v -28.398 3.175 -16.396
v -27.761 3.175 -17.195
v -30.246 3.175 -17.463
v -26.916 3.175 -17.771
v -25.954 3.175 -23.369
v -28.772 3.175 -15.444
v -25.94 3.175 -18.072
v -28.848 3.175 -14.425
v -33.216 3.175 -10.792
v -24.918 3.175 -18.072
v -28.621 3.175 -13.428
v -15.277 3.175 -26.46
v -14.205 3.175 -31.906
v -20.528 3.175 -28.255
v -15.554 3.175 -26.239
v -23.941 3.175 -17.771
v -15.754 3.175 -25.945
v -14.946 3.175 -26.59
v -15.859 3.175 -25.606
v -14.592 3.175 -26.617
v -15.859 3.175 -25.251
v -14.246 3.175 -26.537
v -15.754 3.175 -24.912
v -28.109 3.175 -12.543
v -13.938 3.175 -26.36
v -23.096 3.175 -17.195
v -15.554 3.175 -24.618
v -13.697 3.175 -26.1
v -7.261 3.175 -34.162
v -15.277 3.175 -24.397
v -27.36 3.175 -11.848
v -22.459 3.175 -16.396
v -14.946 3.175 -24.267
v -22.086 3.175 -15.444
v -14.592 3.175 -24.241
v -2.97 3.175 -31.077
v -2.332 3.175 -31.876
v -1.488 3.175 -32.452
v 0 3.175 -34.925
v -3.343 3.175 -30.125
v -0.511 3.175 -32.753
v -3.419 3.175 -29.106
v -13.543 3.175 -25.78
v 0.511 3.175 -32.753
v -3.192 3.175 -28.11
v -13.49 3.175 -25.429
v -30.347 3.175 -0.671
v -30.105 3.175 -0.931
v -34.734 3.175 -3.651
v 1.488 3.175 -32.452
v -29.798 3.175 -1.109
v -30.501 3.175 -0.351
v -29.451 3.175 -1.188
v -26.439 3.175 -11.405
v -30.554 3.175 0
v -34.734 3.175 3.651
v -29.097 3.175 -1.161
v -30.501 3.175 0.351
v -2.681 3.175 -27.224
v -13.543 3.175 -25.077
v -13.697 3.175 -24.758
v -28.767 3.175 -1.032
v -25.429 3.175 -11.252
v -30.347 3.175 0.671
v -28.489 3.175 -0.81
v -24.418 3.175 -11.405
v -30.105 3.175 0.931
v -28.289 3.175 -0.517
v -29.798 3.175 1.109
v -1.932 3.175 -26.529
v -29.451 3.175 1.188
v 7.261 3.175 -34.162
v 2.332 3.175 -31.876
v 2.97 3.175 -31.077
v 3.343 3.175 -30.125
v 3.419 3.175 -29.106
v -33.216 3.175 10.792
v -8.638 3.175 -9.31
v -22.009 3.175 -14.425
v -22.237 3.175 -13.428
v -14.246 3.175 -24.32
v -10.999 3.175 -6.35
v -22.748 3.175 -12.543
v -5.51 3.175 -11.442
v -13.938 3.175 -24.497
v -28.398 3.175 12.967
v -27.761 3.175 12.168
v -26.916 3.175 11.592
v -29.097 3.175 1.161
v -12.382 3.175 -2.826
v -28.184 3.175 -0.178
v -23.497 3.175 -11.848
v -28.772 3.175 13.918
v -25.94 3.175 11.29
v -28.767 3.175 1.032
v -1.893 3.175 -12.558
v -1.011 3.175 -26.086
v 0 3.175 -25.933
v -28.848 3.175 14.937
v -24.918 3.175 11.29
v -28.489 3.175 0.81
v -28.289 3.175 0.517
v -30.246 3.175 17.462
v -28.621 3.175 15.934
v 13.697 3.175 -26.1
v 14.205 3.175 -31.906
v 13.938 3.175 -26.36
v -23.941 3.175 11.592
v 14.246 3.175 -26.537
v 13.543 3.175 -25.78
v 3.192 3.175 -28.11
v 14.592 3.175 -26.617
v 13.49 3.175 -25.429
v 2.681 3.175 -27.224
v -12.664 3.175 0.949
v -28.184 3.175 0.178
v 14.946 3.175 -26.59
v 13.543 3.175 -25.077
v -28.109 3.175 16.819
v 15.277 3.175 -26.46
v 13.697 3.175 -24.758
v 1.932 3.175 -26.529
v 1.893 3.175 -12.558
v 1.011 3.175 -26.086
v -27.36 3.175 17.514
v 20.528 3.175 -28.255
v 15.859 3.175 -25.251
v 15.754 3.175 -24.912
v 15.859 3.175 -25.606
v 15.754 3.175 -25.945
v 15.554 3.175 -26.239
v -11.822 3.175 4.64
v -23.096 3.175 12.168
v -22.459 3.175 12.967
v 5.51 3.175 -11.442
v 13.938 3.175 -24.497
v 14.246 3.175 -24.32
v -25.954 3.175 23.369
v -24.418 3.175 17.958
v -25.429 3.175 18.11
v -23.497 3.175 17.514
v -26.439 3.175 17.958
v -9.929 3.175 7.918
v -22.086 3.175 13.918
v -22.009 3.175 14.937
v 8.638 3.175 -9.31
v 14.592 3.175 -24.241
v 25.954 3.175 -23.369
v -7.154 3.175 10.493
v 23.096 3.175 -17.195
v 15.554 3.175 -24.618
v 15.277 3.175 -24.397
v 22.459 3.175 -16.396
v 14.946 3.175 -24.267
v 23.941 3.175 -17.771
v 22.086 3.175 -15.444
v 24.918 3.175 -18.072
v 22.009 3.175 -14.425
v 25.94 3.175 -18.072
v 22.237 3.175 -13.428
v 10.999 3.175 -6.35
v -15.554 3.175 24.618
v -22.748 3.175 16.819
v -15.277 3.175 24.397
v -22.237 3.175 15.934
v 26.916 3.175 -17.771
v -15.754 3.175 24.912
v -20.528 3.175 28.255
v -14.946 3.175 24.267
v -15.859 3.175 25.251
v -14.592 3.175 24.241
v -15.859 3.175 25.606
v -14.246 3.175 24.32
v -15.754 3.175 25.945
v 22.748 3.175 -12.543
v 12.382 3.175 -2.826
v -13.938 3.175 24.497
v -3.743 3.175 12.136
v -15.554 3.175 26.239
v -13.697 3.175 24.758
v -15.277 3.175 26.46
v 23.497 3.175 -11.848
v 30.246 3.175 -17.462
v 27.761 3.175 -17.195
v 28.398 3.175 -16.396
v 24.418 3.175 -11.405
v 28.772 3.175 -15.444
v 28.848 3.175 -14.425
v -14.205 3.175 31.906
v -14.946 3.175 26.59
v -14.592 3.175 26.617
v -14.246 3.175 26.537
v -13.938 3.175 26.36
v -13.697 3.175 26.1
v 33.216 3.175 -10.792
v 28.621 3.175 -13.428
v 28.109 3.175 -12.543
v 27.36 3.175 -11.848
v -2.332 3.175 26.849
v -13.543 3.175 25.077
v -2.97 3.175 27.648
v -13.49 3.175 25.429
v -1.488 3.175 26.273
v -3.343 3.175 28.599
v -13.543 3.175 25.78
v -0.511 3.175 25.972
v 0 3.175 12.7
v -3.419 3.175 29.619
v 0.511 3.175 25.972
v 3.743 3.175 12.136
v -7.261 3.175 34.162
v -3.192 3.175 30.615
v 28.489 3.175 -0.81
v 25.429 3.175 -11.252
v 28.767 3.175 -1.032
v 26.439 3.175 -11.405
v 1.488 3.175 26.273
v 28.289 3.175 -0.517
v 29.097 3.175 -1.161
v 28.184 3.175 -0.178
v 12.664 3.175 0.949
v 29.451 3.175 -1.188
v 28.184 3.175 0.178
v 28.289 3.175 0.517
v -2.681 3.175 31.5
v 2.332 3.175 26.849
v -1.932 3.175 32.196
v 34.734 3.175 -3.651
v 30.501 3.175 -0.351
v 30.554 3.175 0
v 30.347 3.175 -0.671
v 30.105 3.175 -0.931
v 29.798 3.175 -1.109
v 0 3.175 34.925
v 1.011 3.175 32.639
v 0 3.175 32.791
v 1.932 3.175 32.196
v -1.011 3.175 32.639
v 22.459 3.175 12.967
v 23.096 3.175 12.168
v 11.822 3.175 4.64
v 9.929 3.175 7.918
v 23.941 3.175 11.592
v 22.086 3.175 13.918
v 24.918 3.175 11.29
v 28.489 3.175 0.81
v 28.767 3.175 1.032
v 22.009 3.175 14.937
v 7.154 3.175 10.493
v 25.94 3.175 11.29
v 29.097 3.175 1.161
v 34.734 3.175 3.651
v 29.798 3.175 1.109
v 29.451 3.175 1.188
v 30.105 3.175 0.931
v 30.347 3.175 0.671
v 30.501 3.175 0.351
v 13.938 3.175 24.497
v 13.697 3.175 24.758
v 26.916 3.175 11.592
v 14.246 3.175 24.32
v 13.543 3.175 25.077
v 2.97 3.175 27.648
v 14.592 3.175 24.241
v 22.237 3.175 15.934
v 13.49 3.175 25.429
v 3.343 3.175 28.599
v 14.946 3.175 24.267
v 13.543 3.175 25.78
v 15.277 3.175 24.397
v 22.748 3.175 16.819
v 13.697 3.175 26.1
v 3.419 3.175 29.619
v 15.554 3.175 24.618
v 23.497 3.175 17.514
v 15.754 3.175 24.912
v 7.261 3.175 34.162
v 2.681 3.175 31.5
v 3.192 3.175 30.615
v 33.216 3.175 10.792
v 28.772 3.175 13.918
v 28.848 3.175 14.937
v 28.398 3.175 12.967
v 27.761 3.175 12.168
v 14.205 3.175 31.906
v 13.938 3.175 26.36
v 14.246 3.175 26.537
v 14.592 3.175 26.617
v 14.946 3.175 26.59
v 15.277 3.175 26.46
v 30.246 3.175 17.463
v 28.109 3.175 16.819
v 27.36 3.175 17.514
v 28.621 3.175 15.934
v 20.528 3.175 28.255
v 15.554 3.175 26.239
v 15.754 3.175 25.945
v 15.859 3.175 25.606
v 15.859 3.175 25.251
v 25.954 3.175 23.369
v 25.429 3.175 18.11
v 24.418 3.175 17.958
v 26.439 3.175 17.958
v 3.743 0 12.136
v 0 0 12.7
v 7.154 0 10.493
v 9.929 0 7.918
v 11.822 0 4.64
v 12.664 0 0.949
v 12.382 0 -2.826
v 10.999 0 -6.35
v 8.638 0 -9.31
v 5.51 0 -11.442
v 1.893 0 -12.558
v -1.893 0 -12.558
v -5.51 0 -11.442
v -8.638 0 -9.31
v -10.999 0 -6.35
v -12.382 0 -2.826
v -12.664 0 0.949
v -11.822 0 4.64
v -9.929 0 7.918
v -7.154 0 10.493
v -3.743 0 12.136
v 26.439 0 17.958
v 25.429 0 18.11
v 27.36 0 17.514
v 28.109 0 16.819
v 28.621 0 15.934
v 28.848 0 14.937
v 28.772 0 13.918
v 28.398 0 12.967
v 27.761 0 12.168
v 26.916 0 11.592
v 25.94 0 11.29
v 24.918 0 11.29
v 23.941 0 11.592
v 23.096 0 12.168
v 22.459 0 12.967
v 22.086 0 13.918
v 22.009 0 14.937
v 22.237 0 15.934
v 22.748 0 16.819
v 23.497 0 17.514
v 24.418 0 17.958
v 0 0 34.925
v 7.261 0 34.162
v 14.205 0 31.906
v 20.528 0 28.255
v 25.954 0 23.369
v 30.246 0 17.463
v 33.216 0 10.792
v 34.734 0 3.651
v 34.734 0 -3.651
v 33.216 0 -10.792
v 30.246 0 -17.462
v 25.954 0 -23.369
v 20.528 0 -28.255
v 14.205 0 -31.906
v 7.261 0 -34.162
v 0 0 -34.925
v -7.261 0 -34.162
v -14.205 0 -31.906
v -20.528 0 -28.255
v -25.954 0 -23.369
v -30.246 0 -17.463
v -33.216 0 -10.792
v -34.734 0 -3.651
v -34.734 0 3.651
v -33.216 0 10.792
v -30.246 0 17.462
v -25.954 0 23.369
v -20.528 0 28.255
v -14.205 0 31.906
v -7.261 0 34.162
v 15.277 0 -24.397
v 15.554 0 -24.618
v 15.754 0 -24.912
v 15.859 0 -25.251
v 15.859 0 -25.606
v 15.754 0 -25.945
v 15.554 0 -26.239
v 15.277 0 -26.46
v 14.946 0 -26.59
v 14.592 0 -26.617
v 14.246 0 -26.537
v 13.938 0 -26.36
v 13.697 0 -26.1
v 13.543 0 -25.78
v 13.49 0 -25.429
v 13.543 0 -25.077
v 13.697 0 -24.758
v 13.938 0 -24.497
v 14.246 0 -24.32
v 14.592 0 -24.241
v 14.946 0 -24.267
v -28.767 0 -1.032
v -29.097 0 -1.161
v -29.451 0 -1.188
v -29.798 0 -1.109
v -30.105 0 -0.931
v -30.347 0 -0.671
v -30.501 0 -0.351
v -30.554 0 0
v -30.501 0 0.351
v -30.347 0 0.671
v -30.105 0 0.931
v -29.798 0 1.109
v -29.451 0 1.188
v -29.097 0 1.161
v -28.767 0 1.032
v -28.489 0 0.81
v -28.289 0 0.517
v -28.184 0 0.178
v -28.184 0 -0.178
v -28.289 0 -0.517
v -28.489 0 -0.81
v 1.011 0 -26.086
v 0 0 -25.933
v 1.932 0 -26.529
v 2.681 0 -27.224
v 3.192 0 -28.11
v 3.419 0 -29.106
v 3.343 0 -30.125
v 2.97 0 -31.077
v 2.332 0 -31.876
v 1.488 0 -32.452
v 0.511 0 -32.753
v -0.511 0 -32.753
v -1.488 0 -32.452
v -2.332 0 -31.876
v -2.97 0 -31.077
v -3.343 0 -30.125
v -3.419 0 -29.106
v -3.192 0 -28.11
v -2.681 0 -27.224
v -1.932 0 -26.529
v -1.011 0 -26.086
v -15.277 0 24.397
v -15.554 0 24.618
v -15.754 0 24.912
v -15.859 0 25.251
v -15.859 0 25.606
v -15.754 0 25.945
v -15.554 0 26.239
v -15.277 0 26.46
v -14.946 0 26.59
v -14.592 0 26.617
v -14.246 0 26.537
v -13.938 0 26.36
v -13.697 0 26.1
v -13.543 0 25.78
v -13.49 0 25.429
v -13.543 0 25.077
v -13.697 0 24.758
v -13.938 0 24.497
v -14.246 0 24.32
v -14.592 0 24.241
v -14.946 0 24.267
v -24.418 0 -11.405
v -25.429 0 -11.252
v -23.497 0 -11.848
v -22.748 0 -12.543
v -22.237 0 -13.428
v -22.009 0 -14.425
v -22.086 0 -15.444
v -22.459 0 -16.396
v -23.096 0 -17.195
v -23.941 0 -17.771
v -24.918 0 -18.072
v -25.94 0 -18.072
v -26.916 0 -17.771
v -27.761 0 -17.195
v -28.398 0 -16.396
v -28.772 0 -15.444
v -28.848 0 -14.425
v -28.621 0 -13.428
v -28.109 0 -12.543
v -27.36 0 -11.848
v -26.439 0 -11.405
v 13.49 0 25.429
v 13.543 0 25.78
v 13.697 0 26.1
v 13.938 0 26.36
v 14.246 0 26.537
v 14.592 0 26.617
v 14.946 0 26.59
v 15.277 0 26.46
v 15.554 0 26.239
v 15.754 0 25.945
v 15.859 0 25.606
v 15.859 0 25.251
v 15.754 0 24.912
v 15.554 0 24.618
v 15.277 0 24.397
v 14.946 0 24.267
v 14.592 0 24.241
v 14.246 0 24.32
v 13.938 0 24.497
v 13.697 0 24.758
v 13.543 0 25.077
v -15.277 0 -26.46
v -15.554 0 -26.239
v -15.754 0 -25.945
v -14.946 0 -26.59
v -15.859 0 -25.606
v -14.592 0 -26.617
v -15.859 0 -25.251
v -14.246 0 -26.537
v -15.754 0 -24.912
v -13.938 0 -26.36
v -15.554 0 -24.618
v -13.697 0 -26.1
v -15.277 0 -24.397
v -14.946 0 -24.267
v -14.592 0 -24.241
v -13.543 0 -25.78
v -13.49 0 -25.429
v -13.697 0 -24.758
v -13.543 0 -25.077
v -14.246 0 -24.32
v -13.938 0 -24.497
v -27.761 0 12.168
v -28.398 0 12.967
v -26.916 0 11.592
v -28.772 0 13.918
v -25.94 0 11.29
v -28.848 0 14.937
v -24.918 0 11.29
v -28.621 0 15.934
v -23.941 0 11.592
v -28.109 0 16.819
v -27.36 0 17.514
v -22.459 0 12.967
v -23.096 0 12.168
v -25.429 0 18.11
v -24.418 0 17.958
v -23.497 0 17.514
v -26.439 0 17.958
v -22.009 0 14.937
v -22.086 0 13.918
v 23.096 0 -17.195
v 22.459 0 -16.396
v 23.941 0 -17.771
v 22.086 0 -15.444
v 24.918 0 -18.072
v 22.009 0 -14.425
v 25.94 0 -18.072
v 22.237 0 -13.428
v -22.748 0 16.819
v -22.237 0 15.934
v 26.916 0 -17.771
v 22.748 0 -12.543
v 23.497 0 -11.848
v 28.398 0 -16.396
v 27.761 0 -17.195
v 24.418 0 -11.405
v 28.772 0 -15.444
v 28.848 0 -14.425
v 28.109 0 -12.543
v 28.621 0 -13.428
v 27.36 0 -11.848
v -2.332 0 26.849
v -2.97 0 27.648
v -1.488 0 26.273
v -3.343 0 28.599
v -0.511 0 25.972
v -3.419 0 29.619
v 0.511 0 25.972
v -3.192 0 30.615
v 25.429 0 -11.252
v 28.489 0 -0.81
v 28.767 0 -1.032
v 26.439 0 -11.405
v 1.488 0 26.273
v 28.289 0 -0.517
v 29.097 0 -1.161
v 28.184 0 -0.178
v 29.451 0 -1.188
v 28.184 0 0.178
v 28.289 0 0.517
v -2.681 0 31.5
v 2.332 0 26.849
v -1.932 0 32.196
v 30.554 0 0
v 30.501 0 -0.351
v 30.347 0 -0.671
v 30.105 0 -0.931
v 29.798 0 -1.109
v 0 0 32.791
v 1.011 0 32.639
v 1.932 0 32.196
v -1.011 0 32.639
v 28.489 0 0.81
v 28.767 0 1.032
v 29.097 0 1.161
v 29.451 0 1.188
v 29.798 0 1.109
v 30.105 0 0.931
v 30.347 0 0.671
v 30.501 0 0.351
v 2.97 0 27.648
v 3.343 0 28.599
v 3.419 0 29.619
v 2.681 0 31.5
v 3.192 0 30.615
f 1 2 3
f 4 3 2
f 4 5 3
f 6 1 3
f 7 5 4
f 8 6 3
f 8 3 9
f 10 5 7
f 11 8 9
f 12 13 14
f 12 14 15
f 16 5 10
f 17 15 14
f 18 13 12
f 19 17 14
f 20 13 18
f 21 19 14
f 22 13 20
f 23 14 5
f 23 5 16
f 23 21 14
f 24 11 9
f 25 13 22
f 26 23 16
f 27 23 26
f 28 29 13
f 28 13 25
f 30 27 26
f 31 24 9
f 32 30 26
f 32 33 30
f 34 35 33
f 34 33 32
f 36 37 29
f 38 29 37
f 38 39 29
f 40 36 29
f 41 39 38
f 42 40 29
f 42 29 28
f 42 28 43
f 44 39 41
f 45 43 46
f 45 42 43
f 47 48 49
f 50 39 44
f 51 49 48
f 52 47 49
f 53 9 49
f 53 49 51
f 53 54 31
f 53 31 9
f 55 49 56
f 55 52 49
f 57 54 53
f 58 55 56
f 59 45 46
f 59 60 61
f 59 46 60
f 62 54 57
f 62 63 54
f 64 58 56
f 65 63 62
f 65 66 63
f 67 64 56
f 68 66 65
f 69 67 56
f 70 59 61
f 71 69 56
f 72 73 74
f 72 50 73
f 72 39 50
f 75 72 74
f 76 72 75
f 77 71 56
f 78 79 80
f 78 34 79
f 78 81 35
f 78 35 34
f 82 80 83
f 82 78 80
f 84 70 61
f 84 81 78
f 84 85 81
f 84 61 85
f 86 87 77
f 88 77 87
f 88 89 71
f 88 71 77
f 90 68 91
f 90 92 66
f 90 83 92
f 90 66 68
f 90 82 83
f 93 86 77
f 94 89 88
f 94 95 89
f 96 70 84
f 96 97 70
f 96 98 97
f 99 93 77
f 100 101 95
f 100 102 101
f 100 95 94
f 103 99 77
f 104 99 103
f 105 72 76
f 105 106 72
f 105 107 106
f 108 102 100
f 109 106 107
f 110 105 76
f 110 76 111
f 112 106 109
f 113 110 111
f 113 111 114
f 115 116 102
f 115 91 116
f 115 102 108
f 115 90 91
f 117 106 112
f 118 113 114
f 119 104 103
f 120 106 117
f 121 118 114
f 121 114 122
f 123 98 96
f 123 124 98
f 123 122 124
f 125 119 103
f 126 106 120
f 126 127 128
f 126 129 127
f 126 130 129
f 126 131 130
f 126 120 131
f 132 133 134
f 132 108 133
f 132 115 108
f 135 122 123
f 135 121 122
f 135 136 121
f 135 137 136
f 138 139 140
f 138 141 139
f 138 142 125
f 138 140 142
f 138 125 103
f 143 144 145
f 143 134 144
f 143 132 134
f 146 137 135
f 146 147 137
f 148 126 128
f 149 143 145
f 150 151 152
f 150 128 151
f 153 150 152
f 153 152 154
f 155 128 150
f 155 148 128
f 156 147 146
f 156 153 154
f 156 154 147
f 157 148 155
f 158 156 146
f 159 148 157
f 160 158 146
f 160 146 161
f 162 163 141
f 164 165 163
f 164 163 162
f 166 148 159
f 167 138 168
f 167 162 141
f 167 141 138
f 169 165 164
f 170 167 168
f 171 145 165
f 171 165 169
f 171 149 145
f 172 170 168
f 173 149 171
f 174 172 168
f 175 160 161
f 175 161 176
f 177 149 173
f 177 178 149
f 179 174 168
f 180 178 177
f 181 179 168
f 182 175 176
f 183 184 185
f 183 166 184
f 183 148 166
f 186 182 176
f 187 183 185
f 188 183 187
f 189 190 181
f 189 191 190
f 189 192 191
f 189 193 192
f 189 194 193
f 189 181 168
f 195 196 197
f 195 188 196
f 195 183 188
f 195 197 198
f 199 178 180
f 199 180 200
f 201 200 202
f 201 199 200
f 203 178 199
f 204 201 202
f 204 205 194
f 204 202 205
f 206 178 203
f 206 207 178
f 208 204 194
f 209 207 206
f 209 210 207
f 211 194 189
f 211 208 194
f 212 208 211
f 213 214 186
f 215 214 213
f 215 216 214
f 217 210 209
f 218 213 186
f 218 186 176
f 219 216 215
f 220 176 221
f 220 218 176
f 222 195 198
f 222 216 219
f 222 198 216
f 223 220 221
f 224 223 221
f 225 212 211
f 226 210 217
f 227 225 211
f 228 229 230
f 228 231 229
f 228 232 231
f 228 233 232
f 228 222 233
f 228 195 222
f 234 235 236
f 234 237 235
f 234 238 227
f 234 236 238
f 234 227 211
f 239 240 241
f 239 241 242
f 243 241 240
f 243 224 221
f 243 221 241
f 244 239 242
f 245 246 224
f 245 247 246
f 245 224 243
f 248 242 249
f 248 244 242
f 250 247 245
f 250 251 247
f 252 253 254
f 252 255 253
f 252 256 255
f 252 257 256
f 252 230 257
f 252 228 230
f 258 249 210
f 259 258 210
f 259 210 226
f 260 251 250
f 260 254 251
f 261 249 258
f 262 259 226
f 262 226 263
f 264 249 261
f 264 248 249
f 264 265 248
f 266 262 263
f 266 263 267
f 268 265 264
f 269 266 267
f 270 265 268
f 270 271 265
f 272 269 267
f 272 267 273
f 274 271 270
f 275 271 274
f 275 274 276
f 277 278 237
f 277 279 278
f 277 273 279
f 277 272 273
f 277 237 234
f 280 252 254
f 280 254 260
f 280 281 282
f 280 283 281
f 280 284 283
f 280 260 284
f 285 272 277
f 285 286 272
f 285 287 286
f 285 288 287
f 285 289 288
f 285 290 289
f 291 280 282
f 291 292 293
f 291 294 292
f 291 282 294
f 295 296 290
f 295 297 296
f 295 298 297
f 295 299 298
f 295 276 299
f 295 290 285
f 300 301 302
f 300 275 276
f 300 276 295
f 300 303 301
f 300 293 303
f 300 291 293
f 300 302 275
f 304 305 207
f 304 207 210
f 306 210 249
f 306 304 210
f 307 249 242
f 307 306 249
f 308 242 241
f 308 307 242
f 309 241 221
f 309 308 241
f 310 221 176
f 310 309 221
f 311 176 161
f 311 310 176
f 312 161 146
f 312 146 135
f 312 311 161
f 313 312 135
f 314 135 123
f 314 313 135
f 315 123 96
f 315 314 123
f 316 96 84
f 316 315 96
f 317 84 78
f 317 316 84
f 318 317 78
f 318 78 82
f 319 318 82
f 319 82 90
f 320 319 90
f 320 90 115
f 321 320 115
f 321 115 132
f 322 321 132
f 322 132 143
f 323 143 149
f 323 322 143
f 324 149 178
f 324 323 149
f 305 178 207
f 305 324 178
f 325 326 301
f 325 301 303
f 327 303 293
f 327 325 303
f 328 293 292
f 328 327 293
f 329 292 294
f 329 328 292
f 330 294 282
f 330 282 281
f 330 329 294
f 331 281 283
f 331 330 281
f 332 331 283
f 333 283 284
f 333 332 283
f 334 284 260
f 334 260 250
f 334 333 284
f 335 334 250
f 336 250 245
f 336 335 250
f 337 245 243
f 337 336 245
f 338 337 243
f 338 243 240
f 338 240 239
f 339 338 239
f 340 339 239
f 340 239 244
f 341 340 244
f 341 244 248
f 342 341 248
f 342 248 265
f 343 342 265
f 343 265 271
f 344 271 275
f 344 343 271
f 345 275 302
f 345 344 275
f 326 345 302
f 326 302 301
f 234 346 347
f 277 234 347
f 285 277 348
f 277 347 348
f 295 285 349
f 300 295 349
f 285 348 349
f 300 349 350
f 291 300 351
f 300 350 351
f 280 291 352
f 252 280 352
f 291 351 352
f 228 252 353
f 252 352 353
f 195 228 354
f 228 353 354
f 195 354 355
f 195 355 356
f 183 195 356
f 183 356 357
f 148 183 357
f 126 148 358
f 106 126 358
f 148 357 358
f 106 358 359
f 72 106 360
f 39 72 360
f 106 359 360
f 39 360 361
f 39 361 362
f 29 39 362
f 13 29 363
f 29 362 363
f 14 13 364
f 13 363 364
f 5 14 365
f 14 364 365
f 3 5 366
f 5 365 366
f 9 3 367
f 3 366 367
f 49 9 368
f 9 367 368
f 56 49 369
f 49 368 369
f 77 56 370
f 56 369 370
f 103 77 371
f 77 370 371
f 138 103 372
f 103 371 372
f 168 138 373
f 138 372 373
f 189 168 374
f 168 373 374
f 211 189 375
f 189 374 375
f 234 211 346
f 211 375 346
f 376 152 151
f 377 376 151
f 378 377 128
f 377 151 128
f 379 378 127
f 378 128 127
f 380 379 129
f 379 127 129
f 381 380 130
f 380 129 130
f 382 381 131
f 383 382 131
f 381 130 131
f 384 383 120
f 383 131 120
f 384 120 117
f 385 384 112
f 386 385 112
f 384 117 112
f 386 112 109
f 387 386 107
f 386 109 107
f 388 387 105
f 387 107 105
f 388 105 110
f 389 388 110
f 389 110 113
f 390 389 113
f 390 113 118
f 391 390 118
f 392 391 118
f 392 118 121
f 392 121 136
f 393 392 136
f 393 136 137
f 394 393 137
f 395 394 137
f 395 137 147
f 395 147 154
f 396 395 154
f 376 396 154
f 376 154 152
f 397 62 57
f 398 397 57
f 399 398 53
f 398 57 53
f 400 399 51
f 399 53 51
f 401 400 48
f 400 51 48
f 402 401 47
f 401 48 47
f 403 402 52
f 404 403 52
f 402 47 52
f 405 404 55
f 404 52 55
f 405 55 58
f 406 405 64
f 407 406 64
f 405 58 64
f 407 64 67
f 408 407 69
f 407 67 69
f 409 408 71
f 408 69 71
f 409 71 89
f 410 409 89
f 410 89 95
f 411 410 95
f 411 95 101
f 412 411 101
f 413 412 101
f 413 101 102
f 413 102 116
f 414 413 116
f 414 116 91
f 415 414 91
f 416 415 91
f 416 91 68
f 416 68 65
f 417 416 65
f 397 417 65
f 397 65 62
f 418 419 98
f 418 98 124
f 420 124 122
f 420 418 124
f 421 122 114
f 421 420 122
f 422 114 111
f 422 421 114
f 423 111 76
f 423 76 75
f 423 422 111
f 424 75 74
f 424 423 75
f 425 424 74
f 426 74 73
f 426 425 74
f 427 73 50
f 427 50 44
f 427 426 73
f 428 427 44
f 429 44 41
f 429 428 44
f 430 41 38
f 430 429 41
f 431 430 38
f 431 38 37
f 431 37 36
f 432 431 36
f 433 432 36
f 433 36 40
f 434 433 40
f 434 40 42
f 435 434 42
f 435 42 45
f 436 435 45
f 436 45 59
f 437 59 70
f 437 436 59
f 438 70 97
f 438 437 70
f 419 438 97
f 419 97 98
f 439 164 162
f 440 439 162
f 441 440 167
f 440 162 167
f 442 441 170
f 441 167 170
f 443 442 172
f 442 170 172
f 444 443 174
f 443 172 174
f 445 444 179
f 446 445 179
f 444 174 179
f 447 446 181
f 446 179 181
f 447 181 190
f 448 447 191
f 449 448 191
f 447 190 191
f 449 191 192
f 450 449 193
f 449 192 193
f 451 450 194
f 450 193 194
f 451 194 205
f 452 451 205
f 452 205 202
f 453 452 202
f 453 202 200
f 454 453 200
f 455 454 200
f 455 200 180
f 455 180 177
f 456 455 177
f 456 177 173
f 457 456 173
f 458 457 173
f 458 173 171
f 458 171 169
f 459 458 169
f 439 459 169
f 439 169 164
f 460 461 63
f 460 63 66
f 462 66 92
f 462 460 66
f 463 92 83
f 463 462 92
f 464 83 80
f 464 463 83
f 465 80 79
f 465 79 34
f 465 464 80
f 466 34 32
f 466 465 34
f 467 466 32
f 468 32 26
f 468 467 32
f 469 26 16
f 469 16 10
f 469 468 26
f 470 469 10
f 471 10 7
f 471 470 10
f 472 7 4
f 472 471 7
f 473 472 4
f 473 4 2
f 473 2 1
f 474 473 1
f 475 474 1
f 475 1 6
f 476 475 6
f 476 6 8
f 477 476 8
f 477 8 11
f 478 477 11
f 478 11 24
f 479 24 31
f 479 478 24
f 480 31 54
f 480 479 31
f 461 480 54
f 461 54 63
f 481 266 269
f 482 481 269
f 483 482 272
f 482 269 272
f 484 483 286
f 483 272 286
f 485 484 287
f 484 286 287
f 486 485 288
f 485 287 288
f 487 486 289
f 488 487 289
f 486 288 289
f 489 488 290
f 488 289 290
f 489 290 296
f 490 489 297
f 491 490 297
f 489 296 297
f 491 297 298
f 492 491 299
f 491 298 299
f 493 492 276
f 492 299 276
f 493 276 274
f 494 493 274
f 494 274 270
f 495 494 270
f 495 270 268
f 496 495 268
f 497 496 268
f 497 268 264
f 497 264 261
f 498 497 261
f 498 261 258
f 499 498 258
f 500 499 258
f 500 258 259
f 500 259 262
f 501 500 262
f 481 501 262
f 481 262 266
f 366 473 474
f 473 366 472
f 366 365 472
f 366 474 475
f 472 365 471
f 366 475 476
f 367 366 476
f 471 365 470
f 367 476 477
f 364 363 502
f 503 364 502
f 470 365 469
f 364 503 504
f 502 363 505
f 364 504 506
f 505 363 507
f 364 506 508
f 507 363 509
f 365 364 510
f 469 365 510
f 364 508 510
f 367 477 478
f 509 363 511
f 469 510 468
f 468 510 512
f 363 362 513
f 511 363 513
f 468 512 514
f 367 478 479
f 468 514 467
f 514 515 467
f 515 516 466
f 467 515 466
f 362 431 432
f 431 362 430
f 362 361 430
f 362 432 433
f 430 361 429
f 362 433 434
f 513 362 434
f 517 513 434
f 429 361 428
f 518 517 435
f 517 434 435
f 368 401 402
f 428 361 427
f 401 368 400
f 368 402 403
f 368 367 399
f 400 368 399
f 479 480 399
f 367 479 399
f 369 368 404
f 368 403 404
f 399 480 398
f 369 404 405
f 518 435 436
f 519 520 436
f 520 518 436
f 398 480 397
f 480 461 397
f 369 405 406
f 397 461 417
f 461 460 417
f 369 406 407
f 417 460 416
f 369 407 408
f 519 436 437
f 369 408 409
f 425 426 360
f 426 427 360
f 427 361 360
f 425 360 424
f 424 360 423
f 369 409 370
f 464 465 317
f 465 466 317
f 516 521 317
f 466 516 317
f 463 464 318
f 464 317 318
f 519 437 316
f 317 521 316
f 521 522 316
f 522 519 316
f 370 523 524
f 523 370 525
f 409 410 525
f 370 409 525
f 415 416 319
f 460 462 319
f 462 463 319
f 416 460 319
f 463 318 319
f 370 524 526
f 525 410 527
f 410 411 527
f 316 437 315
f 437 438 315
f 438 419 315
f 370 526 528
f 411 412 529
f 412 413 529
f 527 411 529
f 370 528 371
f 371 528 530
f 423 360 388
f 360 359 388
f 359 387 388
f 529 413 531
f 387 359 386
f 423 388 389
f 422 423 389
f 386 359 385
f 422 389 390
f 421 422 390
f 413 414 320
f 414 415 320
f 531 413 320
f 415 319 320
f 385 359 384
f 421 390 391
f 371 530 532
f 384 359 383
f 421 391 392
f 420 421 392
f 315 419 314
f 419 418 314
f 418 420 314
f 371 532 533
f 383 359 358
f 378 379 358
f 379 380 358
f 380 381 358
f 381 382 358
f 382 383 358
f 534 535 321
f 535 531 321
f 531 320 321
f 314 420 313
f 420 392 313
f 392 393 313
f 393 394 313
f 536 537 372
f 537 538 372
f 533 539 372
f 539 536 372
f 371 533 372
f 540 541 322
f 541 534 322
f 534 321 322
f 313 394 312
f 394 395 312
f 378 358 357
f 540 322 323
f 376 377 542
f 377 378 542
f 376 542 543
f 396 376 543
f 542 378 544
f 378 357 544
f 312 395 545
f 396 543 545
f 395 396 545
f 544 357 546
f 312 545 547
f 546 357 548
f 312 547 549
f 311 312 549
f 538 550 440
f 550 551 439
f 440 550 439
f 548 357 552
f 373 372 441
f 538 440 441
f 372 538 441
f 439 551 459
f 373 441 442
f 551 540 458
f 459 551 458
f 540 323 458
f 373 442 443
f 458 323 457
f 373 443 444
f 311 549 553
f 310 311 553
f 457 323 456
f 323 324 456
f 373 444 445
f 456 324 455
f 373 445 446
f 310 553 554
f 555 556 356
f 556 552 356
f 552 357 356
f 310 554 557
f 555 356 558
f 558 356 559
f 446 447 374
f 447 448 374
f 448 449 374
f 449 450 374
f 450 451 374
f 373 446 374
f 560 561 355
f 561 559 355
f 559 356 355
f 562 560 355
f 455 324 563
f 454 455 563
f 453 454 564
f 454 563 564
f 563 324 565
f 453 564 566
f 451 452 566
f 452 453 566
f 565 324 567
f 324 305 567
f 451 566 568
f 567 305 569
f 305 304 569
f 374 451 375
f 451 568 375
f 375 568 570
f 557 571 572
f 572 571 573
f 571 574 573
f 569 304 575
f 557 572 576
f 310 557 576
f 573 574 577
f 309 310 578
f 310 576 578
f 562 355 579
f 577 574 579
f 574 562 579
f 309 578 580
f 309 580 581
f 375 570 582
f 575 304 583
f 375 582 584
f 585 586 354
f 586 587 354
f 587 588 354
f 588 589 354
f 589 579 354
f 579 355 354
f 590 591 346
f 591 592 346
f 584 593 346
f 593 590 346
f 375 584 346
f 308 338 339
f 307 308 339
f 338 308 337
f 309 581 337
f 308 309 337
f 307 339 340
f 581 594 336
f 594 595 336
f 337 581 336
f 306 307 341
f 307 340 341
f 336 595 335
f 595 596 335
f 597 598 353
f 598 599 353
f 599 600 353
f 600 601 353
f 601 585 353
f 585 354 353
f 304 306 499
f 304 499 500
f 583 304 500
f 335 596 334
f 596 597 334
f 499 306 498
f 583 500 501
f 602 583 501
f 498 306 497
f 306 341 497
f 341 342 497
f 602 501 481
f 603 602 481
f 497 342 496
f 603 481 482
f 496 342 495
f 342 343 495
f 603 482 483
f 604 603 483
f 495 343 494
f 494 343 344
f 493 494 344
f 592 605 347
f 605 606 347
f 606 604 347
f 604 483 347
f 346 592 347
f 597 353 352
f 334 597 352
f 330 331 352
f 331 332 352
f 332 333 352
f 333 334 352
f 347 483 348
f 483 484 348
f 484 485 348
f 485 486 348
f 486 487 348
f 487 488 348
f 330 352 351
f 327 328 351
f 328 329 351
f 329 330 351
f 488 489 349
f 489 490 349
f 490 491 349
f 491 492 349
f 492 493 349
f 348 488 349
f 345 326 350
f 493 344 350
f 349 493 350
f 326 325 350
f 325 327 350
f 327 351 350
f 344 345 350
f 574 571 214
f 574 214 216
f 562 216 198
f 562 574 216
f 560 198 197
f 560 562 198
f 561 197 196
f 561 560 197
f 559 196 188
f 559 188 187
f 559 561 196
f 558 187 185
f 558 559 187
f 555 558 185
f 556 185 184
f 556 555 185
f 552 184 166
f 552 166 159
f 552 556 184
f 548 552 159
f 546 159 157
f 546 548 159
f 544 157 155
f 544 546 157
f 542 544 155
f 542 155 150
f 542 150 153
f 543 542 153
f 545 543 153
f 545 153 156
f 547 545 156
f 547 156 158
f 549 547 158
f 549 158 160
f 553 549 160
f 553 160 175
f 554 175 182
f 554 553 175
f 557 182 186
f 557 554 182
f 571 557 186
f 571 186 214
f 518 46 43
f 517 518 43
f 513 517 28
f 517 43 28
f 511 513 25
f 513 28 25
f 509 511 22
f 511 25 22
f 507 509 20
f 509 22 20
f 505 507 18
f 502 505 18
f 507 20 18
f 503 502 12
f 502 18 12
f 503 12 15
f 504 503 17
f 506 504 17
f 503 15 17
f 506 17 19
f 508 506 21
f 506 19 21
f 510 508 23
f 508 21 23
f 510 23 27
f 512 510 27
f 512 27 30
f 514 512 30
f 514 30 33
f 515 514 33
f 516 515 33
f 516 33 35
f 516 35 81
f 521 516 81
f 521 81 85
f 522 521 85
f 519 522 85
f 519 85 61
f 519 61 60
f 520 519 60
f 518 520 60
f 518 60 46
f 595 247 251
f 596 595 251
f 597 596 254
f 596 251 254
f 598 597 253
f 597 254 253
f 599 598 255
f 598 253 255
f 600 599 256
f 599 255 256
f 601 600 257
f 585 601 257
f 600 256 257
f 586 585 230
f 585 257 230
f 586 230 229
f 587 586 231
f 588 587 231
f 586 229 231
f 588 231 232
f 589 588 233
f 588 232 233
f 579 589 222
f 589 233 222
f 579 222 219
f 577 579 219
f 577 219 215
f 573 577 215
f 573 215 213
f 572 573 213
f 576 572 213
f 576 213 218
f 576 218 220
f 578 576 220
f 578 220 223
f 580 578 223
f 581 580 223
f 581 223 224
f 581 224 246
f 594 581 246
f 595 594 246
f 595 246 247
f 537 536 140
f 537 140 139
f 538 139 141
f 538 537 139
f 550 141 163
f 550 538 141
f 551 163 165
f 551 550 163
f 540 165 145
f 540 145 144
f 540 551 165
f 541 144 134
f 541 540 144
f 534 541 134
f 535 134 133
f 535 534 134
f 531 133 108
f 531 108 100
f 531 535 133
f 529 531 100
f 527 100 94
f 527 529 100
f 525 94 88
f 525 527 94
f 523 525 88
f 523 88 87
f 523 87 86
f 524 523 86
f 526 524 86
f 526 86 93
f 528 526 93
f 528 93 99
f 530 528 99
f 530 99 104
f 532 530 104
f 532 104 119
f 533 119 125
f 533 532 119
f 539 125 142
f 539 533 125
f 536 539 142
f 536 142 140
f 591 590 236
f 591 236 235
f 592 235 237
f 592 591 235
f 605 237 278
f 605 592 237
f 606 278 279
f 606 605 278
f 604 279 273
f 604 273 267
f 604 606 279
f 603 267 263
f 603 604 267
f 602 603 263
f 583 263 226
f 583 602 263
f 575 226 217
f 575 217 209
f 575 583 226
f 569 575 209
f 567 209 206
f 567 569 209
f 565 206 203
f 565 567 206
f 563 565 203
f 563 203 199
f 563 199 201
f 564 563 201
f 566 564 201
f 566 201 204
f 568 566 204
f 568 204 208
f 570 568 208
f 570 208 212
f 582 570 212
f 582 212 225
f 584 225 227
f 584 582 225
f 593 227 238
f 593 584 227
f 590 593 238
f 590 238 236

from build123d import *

# Parameters (mm, degrees)
SKETCH1_R                   = 34.925
SKETCH1_R_2                 = 12.7
SKETCH1_R_3                 = 3.429
BOSS_EXTRUDE1_DEPTH         = 3.175
TAP_DRILL_FOR_2_HELICOIL1_D = 2.38252
CIRPATTERN1_COUNT           = 6


with BuildPart() as part:
    # Sketch1 → Boss-Extrude1 (new body)
    with BuildSketch(Plane(origin=(0, 0, 0), x_dir=(1, 0, 0), z_dir=(0, 1, 0))):
        with Locations(Location((0, 0, 0), (0, 0, 270))):
            Circle(SKETCH1_R)
        with Locations(Location((0, 0, 0), (0, 0, 270))):
            Circle(SKETCH1_R_2, mode=Mode.SUBTRACT)
        with Locations(Location((0, 29.3624, 0), (0, 0, 270))):
            Circle(SKETCH1_R_3, mode=Mode.SUBTRACT)
        with Locations(Location((25.428584316, 14.6812, 0), (0, 0, 270))):
            Circle(SKETCH1_R_3, mode=Mode.SUBTRACT)
        with Locations(Location((25.428584316, -14.6812, 0), (0, 0, 270))):
            Circle(SKETCH1_R_3, mode=Mode.SUBTRACT)
        with Locations(Location((0, -29.3624, 0), (0, 0, 270))):
            Circle(SKETCH1_R_3, mode=Mode.SUBTRACT)
        with Locations(Location((-25.428584316, -14.6812, 0), (0, 0, 270))):
            Circle(SKETCH1_R_3, mode=Mode.SUBTRACT)
        with Locations(Location((-25.428584316, 14.6812, 0), (0, 0, 270))):
            Circle(SKETCH1_R_3, mode=Mode.SUBTRACT)
    extrude(amount=BOSS_EXTRUDE1_DEPTH)

    # Tap Drill for #2 Helicoil1 (through all)
    with Locations(Plane(origin=(0, 0, 0), x_dir=(-1, 0, 0), z_dir=(0, -1, 0))):
        with Locations((14.6812, 25.428584316)):
            tap_drill_for_2_helicoil1 = Hole(TAP_DRILL_FOR_2_HELICOIL1_D / 2)

    # CirPattern1: Tap Drill for #2 Helicoil1 ×6 about axis
    cirpattern1_axis = Axis((0, 0, 0), (0, 1, 0))
    for i in range(1, CIRPATTERN1_COUNT):
        add(tap_drill_for_2_helicoil1.rotate(cirpattern1_axis, i * 360 / CIRPATTERN1_COUNT), mode=Mode.SUBTRACT)


solid = part.part
